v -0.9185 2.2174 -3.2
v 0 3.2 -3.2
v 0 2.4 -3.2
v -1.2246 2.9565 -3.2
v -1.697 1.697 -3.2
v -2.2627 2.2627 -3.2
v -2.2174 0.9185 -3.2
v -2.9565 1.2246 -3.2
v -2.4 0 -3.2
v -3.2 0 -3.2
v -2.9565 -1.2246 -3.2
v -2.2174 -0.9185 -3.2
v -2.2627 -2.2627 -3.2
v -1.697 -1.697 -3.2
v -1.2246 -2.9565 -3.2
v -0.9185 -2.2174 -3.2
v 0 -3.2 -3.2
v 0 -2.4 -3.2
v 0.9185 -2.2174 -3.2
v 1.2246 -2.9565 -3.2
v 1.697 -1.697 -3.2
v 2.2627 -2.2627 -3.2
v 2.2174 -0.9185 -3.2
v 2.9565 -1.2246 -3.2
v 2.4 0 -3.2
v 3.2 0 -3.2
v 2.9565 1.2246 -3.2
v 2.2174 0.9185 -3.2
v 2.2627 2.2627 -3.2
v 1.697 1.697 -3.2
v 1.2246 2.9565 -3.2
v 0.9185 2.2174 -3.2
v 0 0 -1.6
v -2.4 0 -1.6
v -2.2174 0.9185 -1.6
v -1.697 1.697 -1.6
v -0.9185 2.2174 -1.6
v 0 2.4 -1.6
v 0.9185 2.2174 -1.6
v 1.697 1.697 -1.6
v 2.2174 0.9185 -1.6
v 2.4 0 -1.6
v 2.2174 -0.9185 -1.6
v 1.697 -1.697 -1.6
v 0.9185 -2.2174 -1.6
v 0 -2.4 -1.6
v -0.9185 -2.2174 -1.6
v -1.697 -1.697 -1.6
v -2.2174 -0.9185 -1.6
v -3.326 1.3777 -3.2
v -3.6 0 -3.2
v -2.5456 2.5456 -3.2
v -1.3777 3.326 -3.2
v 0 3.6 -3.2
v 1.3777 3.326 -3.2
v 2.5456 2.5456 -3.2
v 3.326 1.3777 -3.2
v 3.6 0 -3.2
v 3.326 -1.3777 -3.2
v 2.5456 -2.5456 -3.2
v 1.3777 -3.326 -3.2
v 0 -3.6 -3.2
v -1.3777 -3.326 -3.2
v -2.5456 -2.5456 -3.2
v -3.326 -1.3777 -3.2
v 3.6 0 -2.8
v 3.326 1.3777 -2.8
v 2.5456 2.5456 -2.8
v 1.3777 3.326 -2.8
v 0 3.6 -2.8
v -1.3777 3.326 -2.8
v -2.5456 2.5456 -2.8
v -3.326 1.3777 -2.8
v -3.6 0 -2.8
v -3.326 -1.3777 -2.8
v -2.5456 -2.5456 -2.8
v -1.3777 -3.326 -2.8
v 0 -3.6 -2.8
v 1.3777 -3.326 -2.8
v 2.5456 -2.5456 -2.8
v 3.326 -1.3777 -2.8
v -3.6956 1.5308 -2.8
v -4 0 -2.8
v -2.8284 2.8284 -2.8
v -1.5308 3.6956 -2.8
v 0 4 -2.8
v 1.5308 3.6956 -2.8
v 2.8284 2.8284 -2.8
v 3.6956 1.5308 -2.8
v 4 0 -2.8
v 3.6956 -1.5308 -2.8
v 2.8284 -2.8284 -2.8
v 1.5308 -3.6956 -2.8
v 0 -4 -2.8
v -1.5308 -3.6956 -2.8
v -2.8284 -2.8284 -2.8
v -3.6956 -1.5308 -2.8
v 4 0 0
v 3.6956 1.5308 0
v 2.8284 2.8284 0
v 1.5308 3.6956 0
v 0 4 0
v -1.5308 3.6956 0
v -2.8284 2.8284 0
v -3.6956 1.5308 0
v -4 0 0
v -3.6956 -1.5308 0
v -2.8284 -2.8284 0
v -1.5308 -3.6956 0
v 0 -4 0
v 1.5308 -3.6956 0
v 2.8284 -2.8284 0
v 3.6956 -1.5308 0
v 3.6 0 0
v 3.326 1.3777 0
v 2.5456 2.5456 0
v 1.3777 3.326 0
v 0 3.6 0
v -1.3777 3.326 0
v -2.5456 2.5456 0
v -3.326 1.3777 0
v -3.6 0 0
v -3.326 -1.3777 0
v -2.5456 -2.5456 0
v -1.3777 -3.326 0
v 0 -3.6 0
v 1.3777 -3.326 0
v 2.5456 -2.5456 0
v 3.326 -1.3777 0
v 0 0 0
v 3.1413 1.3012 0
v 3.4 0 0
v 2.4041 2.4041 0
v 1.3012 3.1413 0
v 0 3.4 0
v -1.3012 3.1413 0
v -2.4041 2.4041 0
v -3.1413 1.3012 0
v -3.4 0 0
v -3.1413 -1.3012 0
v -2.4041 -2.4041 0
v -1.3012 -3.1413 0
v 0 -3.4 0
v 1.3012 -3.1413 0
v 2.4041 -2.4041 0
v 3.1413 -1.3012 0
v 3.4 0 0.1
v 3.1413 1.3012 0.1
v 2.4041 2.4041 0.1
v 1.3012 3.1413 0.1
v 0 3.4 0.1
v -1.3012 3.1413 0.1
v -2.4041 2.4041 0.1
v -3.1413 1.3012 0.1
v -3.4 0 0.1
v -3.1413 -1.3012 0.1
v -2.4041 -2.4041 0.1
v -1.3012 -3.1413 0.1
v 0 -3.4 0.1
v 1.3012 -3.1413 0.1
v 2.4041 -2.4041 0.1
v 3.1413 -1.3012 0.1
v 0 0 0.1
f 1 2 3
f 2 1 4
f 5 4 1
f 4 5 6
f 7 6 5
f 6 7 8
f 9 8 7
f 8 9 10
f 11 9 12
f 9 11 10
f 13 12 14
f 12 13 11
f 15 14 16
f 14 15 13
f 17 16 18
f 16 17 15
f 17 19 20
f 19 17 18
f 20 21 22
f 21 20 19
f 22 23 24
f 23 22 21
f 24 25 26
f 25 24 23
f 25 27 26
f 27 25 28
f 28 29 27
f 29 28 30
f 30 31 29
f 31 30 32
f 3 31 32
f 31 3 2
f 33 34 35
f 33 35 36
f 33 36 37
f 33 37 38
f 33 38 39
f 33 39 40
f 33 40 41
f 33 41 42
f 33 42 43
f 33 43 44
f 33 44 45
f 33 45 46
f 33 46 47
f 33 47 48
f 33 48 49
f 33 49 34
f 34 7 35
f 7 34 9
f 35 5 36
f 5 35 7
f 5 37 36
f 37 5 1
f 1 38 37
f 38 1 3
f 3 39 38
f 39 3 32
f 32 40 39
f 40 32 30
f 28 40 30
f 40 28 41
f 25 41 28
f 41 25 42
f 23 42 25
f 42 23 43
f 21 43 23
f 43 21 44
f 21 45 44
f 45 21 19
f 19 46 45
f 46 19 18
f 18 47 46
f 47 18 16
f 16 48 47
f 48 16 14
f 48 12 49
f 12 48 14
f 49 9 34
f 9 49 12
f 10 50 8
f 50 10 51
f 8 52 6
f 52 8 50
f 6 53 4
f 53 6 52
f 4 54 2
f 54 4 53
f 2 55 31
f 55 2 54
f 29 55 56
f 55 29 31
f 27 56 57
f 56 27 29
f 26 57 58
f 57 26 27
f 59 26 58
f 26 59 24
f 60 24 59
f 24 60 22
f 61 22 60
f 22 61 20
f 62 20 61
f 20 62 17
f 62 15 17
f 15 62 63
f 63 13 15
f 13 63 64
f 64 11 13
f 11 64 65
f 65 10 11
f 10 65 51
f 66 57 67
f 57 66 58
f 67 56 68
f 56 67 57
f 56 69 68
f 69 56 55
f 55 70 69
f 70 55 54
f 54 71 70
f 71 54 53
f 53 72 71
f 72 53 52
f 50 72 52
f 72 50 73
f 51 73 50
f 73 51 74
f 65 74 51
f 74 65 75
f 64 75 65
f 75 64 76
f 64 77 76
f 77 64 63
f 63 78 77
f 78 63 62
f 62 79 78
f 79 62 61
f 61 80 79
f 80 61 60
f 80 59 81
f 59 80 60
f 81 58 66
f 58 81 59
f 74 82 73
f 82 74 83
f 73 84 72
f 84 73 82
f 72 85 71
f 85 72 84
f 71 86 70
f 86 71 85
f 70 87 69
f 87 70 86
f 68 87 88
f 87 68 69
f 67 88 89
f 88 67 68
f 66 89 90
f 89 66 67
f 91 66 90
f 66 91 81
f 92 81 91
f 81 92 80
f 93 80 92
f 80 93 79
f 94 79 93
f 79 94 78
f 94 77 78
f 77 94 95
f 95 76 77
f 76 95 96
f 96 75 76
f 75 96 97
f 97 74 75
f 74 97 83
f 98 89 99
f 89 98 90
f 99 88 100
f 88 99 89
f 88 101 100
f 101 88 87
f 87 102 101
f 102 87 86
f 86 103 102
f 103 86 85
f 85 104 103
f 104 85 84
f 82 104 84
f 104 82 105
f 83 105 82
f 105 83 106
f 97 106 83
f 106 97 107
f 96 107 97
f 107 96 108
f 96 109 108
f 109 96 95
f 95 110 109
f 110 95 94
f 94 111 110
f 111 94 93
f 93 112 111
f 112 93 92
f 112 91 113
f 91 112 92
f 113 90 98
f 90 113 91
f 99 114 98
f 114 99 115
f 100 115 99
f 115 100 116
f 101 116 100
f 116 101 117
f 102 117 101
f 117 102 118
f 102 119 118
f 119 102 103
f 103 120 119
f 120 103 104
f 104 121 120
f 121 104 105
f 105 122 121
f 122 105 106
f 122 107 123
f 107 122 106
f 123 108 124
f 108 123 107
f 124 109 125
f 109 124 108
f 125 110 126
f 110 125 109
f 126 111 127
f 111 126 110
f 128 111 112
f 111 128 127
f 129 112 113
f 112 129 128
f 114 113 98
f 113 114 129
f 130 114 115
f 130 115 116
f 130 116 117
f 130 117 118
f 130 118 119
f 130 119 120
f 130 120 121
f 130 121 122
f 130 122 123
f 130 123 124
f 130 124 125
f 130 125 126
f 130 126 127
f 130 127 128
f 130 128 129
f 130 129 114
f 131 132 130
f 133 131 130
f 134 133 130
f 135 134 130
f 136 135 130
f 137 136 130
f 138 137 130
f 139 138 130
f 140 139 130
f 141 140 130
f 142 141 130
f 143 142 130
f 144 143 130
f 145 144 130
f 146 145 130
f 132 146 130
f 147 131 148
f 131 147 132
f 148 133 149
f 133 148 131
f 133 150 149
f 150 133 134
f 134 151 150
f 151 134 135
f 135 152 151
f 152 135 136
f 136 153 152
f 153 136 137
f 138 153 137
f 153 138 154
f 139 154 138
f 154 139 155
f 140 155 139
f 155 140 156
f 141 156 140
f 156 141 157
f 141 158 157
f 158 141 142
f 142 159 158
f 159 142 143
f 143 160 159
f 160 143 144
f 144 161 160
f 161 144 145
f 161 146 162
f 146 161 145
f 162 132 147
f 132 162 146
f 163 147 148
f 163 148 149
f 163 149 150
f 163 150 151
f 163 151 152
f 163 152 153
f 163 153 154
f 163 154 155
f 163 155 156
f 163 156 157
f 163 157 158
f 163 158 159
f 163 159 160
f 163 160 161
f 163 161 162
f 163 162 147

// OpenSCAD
// file: ../p/4-4ring3.scad
use <../lib.scad>
function ldraw_lib__4_4ring3() = [
// 0 Ring  3 x 1.0
// 0 Name: 4-4ring3.dat
// 0 Author: James Jessiman
// 0 !LDRAW_ORG Primitive UPDATE 2009-01
// 0 !LICENSE Licensed under CC BY 4.0 : see CAreadme.txt
// 
// 0 BFC CERTIFY CCW
  [0,"BFC","CERTIFY"],
  [0,"BFC","CCW"],
// 
// 0 !HISTORY 1998-12-15 [PTadmin] Official Update 1998-10
// 0 !HISTORY 2002-04-05 [hafhead] Added BFC statement
// 0 !HISTORY 2002-04-25 [PTadmin] Official Update 2002-02
// 0 !HISTORY 2007-06-24 [PTadmin] Header formatted for Contributor Agreement
// 0 !HISTORY 2008-07-01 [PTadmin] Official Update 2008-01
// 0 !HISTORY 2008-08-26 [cwdee] Switch polygon winding and rename
// 0 !HISTORY 2009-05-02 [PTadmin] Official Update 2009-01
// 
// 
// 4 16 -1.5308 0 3.6956 -1.1481 0 2.7717 0 0 3 0 0 4
  [4,16,-1.5308,0,3.6956,-1.1481,0,2.7717,0,0,3,0,0,4],
// 4 16 -2.8284 0 2.8284 -2.1213 0 2.1213 -1.1481 0 2.7717 -1.5308 0 3.6956
  [4,16,-2.8284,0,2.8284,-2.1213,0,2.1213,-1.1481,0,2.7717,-1.5308,0,3.6956],
// 4 16 -3.6956 0 1.5308 -2.7717 0 1.1481 -2.1213 0 2.1213 -2.8284 0 2.8284
  [4,16,-3.6956,0,1.5308,-2.7717,0,1.1481,-2.1213,0,2.1213,-2.8284,0,2.8284],
// 4 16 -4 0 0 -3 0 0 -2.7717 0 1.1481 -3.6956 0 1.5308
  [4,16,-4,0,0,-3,0,0,-2.7717,0,1.1481,-3.6956,0,1.5308],
// 4 16 -3.6956 0 -1.5308 -2.7717 0 -1.1481 -3 0 0 -4 0 0
  [4,16,-3.6956,0,-1.5308,-2.7717,0,-1.1481,-3,0,0,-4,0,0],
// 4 16 -2.8284 0 -2.8284 -2.1213 0 -2.1213 -2.7717 0 -1.1481 -3.6956 0 -1.5308
  [4,16,-2.8284,0,-2.8284,-2.1213,0,-2.1213,-2.7717,0,-1.1481,-3.6956,0,-1.5308],
// 4 16 -1.5308 0 -3.6956 -1.1481 0 -2.7717 -2.1213 0 -2.1213 -2.8284 0 -2.8284
  [4,16,-1.5308,0,-3.6956,-1.1481,0,-2.7717,-2.1213,0,-2.1213,-2.8284,0,-2.8284],
// 4 16 0 0 -4 0 0 -3 -1.1481 0 -2.7717 -1.5308 0 -3.6956
  [4,16,0,0,-4,0,0,-3,-1.1481,0,-2.7717,-1.5308,0,-3.6956],
// 4 16 1.5308 0 -3.6956 1.1481 0 -2.7717 0 0 -3 0 0 -4
  [4,16,1.5308,0,-3.6956,1.1481,0,-2.7717,0,0,-3,0,0,-4],
// 4 16 2.8284 0 -2.8284 2.1213 0 -2.1213 1.1481 0 -2.7717 1.5308 0 -3.6956
  [4,16,2.8284,0,-2.8284,2.1213,0,-2.1213,1.1481,0,-2.7717,1.5308,0,-3.6956],
// 4 16 3.6956 0 -1.5308 2.7717 0 -1.1481 2.1213 0 -2.1213 2.8284 0 -2.8284
  [4,16,3.6956,0,-1.5308,2.7717,0,-1.1481,2.1213,0,-2.1213,2.8284,0,-2.8284],
// 4 16 4 0 0 3 0 0 2.7717 0 -1.1481 3.6956 0 -1.5308
  [4,16,4,0,0,3,0,0,2.7717,0,-1.1481,3.6956,0,-1.5308],
// 4 16 3.6956 0 1.5308 2.7717 0 1.1481 3 0 0 4 0 0
  [4,16,3.6956,0,1.5308,2.7717,0,1.1481,3,0,0,4,0,0],
// 4 16 2.8284 0 2.8284 2.1213 0 2.1213 2.7717 0 1.1481 3.6956 0 1.5308
  [4,16,2.8284,0,2.8284,2.1213,0,2.1213,2.7717,0,1.1481,3.6956,0,1.5308],
// 4 16 1.5308 0 3.6956 1.1481 0 2.7717 2.1213 0 2.1213 2.8284 0 2.8284
  [4,16,1.5308,0,3.6956,1.1481,0,2.7717,2.1213,0,2.1213,2.8284,0,2.8284],
// 4 16 0 0 4 0 0 3 1.1481 0 2.7717 1.5308 0 3.6956
  [4,16,0,0,4,0,0,3,1.1481,0,2.7717,1.5308,0,3.6956],
// 0
];
module ldraw_lib__4_4ring3(step=0, col=false, unit=2/5, alt=false, line=0.2, solid=!$preview)
    makepoly(ldraw_lib__4_4ring3(), step=step, col=col, unit=unit, alt=alt, line=line, solid=solid);
ldraw_lib__4_4ring3(line=0.2);
// file: ../p/4-4cylc.scad
use <../lib.scad>
use <4-4cyli.scad>
use <4-4disc.scad>
use <4-4edge.scad>
function ldraw_lib__4_4cylc() = [
// 0 Cylinder Closed 1.0
// 0 Name: 4-4cylc.dat
// 0 Author: Alex Taylor [anathema]
// 0 !LDRAW_ORG Primitive UPDATE 2009-02
// 0 !LICENSE Licensed under CC BY 4.0 : see CAreadme.txt
// 
// 0 BFC CERTIFY CCW
  [0,"BFC","CERTIFY"],
  [0,"BFC","CCW"],
// 
// 0 !HISTORY 2008-12-29 [cwdee] Removed one disc
// 0 !HISTORY 2009-09-03 [PTadmin] Official Update 2009-02
// 
// 
// 1 16 0 0 0 1 0 0 0 1 0 0 0 1 4-4edge.dat
  [1,16,0,0,0,1,0,0,0,1,0,0,0,1, ldraw_lib__4_4edge()],
// 1 16 0 1 0 1 0 0 0 1 0 0 0 1 4-4edge.dat
  [1,16,0,1,0,1,0,0,0,1,0,0,0,1, ldraw_lib__4_4edge()],
// 1 16 0 0 0 1 0 0 0 1 0 0 0 1 4-4disc.dat
  [1,16,0,0,0,1,0,0,0,1,0,0,0,1, ldraw_lib__4_4disc()],
// 1 16 0 0 0 1 0 0 0 1 0 0 0 1 4-4cyli.dat
  [1,16,0,0,0,1,0,0,0,1,0,0,0,1, ldraw_lib__4_4cyli()],
// 0
];
module ldraw_lib__4_4cylc(step=0, col=false, unit=2/5, alt=false, line=0.2, solid=!$preview)
    makepoly(ldraw_lib__4_4cylc(), step=step, col=col, unit=unit, alt=alt, line=line, solid=solid);
ldraw_lib__4_4cylc(line=0.2);
// file: ../p/4-4edge.scad
use <../lib.scad>
function ldraw_lib__4_4edge() = [
// 0 Circle 1.0
// 0 Name: 4-4edge.dat
// 0 Author: James Jessiman
// 0 !LDRAW_ORG Primitive UPDATE 2017-01
// 0 !LICENSE Licensed under CC BY 4.0 : see CAreadme.txt
// 
// 0 BFC CERTIFY CCW
  [0,"BFC","CERTIFY"],
  [0,"BFC","CCW"],
// 
// 0 !HISTORY 1998-12-15 [PTadmin] Official Update 1998-10
// 0 !HISTORY 2005-12-28 [PTadmin] Official Update 2005-01
// 0 !HISTORY 2007-06-24 [PTadmin] Header formatted for Contributor Agreement
// 0 !HISTORY 2008-07-01 [PTadmin] Official Update 2008-01
// 0 !HISTORY 2017-01-15 [Steffen] BFCed
// 0 !HISTORY 2017-12-30 [PTadmin] Official Update 2017-01
// 
// 
// 2 24 1 0 0 0.9239 0 0.3827
  [2,24,1,0,0,0.9239,0,0.3827],
// 2 24 0.9239 0 0.3827 0.7071 0 0.7071
  [2,24,0.9239,0,0.3827,0.7071,0,0.7071],
// 2 24 0.7071 0 0.7071 0.3827 0 0.9239
  [2,24,0.7071,0,0.7071,0.3827,0,0.9239],
// 2 24 0.3827 0 0.9239 0 0 1
  [2,24,0.3827,0,0.9239,0,0,1],
// 2 24 0 0 1 -0.3827 0 0.9239
  [2,24,0,0,1,-0.3827,0,0.9239],
// 2 24 -0.3827 0 0.9239 -0.7071 0 0.7071
  [2,24,-0.3827,0,0.9239,-0.7071,0,0.7071],
// 2 24 -0.7071 0 0.7071 -0.9239 0 0.3827
  [2,24,-0.7071,0,0.7071,-0.9239,0,0.3827],
// 2 24 -0.9239 0 0.3827 -1 0 -0
  [2,24,-0.9239,0,0.3827,-1,0,-0],
// 2 24 -1 0 -0 -0.9239 0 -0.3827
  [2,24,-1,0,-0,-0.9239,0,-0.3827],
// 2 24 -0.9239 0 -0.3827 -0.7071 0 -0.7071
  [2,24,-0.9239,0,-0.3827,-0.7071,0,-0.7071],
// 2 24 -0.7071 0 -0.7071 -0.3827 0 -0.9239
  [2,24,-0.7071,0,-0.7071,-0.3827,0,-0.9239],
// 2 24 -0.3827 0 -0.9239 0 0 -1
  [2,24,-0.3827,0,-0.9239,0,0,-1],
// 2 24 0 0 -1 0.3827 0 -0.9239
  [2,24,0,0,-1,0.3827,0,-0.9239],
// 2 24 0.3827 0 -0.9239 0.7071 0 -0.7071
  [2,24,0.3827,0,-0.9239,0.7071,0,-0.7071],
// 2 24 0.7071 0 -0.7071 0.9239 0 -0.3827
  [2,24,0.7071,0,-0.7071,0.9239,0,-0.3827],
// 2 24 0.9239 0 -0.3827 1 0 0
  [2,24,0.9239,0,-0.3827,1,0,0],
];
module ldraw_lib__4_4edge(step=0, col=false, unit=2/5, alt=false, line=0.2, solid=!$preview)
    makepoly(ldraw_lib__4_4edge(), step=step, col=col, unit=unit, alt=alt, line=line, solid=solid);
ldraw_lib__4_4edge(line=0.2);
// file: ../p/stud4o.scad
use <../lib.scad>
use <4-4cylc.scad>
use <4-4ring3.scad>
function ldraw_lib__stud4o() = [
// 0 Stud Tube Open without Outer Cylinder
// 0 Name: stud4o.dat
// 0 Author: Magnus Forsberg [MagFors]
// 0 !LDRAW_ORG Primitive UPDATE 2011-02
// 0 !LICENSE Licensed under CC BY 4.0 : see CAreadme.txt
// 
// 0 !HELP This stud is a "antistud" to be used like a underside stud,
// 0 !HELP but without the outer cylinder.
// 0 !HELP 1 47 0 0 0 1 0 0 0 1 0 0 0 1 stud4.dat
// 
// 0 BFC CERTIFY CCW
  [0,"BFC","CERTIFY"],
  [0,"BFC","CCW"],
// 
// 0 !HISTORY 2011-12-29 [PTadmin] Official Update 2011-02
// 
// 
// 1 16 0 -4 0 2 0 0 0 1 0 0 0 2 4-4ring3.dat
  [1,16,0,-4,0,2,0,0,0,1,0,0,0,2, ldraw_lib__4_4ring3()],
// 0 BFC INVERTNEXT
  [0,"BFC","INVERTNEXT"],
// 1 16 0 0 0 -6 0 0 0 -4 0 0 0 6 4-4cylc.dat
  [1,16,0,0,0,-6,0,0,0,-4,0,0,0,6, ldraw_lib__4_4cylc()],
];
module ldraw_lib__stud4o(step=0, col=false, unit=2/5, alt=false, line=0.2, solid=!$preview)
    makepoly(ldraw_lib__stud4o(), step=step, col=col, unit=unit, alt=alt, line=line, solid=solid);
ldraw_lib__stud4o(line=0.2);
// file: ../p/4-4ring8.scad
use <../lib.scad>
function ldraw_lib__4_4ring8() = [
// 0 Ring  8 x 1.0
// 0 Name: 4-4ring8.dat
// 0 Author: Steffen [Steffen]
// 0 !LDRAW_ORG Primitive UPDATE 2012-01
// 0 !LICENSE Licensed under CC BY 4.0 : see CAreadme.txt
// 
// 0 BFC CERTIFY CCW
  [0,"BFC","CERTIFY"],
  [0,"BFC","CCW"],
// 
// 0 !HISTORY 2003-12-19 [PTadmin] Official Update 2003-03
// 0 !HISTORY 2007-06-24 [PTadmin] Header formatted for Contributor Agreement
// 0 !HISTORY 2008-07-01 [PTadmin] Official Update 2008-01
// 0 !HISTORY 2012-02-16 [Philo] Changed to CCW
// 0 !HISTORY 2012-03-30 [PTadmin] Official Update 2012-01
// 
// 
// 4 16 9 0 0 8.3151 0 3.4443 7.3912 0 3.0616 8 0 0
  [4,16,9,0,0,8.3151,0,3.4443,7.3912,0,3.0616,8,0,0],
// 4 16 8.3151 0 3.4443 6.3639 0 6.3639 5.6568 0 5.6568 7.3912 0 3.0616
  [4,16,8.3151,0,3.4443,6.3639,0,6.3639,5.6568,0,5.6568,7.3912,0,3.0616],
// 4 16 6.3639 0 6.3639 3.4443 0 8.3151 3.0616 0 7.3912 5.6568 0 5.6568
  [4,16,6.3639,0,6.3639,3.4443,0,8.3151,3.0616,0,7.3912,5.6568,0,5.6568],
// 4 16 3.4443 0 8.3151 0 0 9 0 0 8 3.0616 0 7.3912
  [4,16,3.4443,0,8.3151,0,0,9,0,0,8,3.0616,0,7.3912],
// 4 16 0 0 9 -3.4443 0 8.3151 -3.0616 0 7.3912 0 0 8
  [4,16,0,0,9,-3.4443,0,8.3151,-3.0616,0,7.3912,0,0,8],
// 4 16 -3.4443 0 8.3151 -6.3639 0 6.3639 -5.6568 0 5.6568 -3.0616 0 7.3912
  [4,16,-3.4443,0,8.3151,-6.3639,0,6.3639,-5.6568,0,5.6568,-3.0616,0,7.3912],
// 4 16 -6.3639 0 6.3639 -8.3151 0 3.4443 -7.3912 0 3.0616 -5.6568 0 5.6568
  [4,16,-6.3639,0,6.3639,-8.3151,0,3.4443,-7.3912,0,3.0616,-5.6568,0,5.6568],
// 4 16 -8.3151 0 3.4443 -9 0 0 -8 0 0 -7.3912 0 3.0616
  [4,16,-8.3151,0,3.4443,-9,0,0,-8,0,0,-7.3912,0,3.0616],
// 4 16 -9 0 0 -8.3151 0 -3.4443 -7.3912 0 -3.0616 -8 0 0
  [4,16,-9,0,0,-8.3151,0,-3.4443,-7.3912,0,-3.0616,-8,0,0],
// 4 16 -8.3151 0 -3.4443 -6.3639 0 -6.3639 -5.6568 0 -5.6568 -7.3912 0 -3.0616
  [4,16,-8.3151,0,-3.4443,-6.3639,0,-6.3639,-5.6568,0,-5.6568,-7.3912,0,-3.0616],
// 4 16 -6.3639 0 -6.3639 -3.4443 0 -8.3151 -3.0616 0 -7.3912 -5.6568 0 -5.6568
  [4,16,-6.3639,0,-6.3639,-3.4443,0,-8.3151,-3.0616,0,-7.3912,-5.6568,0,-5.6568],
// 4 16 -3.4443 0 -8.3151 0 0 -9 0 0 -8 -3.0616 0 -7.3912
  [4,16,-3.4443,0,-8.3151,0,0,-9,0,0,-8,-3.0616,0,-7.3912],
// 4 16 0 0 -9 3.4443 0 -8.3151 3.0616 0 -7.3912 0 0 -8
  [4,16,0,0,-9,3.4443,0,-8.3151,3.0616,0,-7.3912,0,0,-8],
// 4 16 3.4443 0 -8.3151 6.3639 0 -6.3639 5.6568 0 -5.6568 3.0616 0 -7.3912
  [4,16,3.4443,0,-8.3151,6.3639,0,-6.3639,5.6568,0,-5.6568,3.0616,0,-7.3912],
// 4 16 6.3639 0 -6.3639 8.3151 0 -3.4443 7.3912 0 -3.0616 5.6568 0 -5.6568
  [4,16,6.3639,0,-6.3639,8.3151,0,-3.4443,7.3912,0,-3.0616,5.6568,0,-5.6568],
// 4 16 8.3151 0 -3.4443 9 0 0 8 0 0 7.3912 0 -3.0616
  [4,16,8.3151,0,-3.4443,9,0,0,8,0,0,7.3912,0,-3.0616],
];
module ldraw_lib__4_4ring8(step=0, col=false, unit=2/5, alt=false, line=0.2, solid=!$preview)
    makepoly(ldraw_lib__4_4ring8(), step=step, col=col, unit=unit, alt=alt, line=line, solid=solid);
ldraw_lib__4_4ring8(line=0.2);
// file: ../p/4-4cylo.scad
use <../lib.scad>
use <4-4cyli.scad>
use <4-4edge.scad>
function ldraw_lib__4_4cylo() = [
// 0 Cylinder Open 1.0
// 0 Name: 4-4cylo.dat
// 0 Author: Mark Kennedy [mkennedy]
// 0 !LDRAW_ORG Primitive UPDATE 2010-01
// 0 !LICENSE Licensed under CC BY 4.0 : see CAreadme.txt
// 
// 0 BFC CERTIFY CCW
  [0,"BFC","CERTIFY"],
  [0,"BFC","CCW"],
// 
// 0 !HISTORY 2010-04-05 [PTadmin] Official Update 2010-01
// 
// 
// 1 16 0 0 0 1 0 0 0 1 0 0 0 1 4-4edge.dat
  [1,16,0,0,0,1,0,0,0,1,0,0,0,1, ldraw_lib__4_4edge()],
// 1 16 0 1 0 1 0 0 0 1 0 0 0 1 4-4edge.dat
  [1,16,0,1,0,1,0,0,0,1,0,0,0,1, ldraw_lib__4_4edge()],
// 1 16 0 0 0 1 0 0 0 1 0 0 0 1 4-4cyli.dat
  [1,16,0,0,0,1,0,0,0,1,0,0,0,1, ldraw_lib__4_4cyli()],
// 0
];
module ldraw_lib__4_4cylo(step=0, col=false, unit=2/5, alt=false, line=0.2, solid=!$preview)
    makepoly(ldraw_lib__4_4cylo(), step=step, col=col, unit=unit, alt=alt, line=line, solid=solid);
ldraw_lib__4_4cylo(line=0.2);
// file: s/98138s02.scad
use <../../lib.scad>
use <../../p/4-4cylo.scad>
use <../../p/4-4ring8.scad>
use <../../p/4-4ring9.scad>
use <../../p/stud4o.scad>
function ldraw_lib__s__98138s02() = [
// 0 ~Tile  1 x  1 Round with Groove without Complete Top Face
// 0 Name: s\98138s02.dat
// 0 Author: Magnus Forsberg [MagFors]
// 0 !LDRAW_ORG Subpart UPDATE 2020-01
// 0 !LICENSE Licensed under CC BY 4.0 : see CAreadme.txt
// 
// 0 BFC CERTIFY CCW
  [0,"BFC","CERTIFY"],
  [0,"BFC","CCW"],
// 
// 0 !HISTORY 2020-06-28 [PTadmin] Official Update 2020-01
// 
// 
// 1 16 0 4 0 1 0 0 0 -1 0 0 0 1 stud4o.dat
  [1,16,0,4,0,1,0,0,0,-1,0,0,0,1, ldraw_lib__stud4o()],
// 1 16 0 8 0 -1 0 0 0 -1 0 0 0 1 4-4ring8.dat
  [1,16,0,8,0,-1,0,0,0,-1,0,0,0,1, ldraw_lib__4_4ring8()],
// 1 16 0 7 0 9 0 0 0 1 0 0 0 9 4-4cylo.dat
  [1,16,0,7,0,9,0,0,0,1,0,0,0,9, ldraw_lib__4_4cylo()],
// 1 16 0 7 0 -1 0 0 0 -1 0 0 0 1 4-4ring9.dat
  [1,16,0,7,0,-1,0,0,0,-1,0,0,0,1, ldraw_lib__4_4ring9()],
// 1 16 0 0 0 10 0 0 0 7 0 0 0 10 4-4cylo.dat
  [1,16,0,0,0,10,0,0,0,7,0,0,0,10, ldraw_lib__4_4cylo()],
];
module ldraw_lib__s__98138s02(step=0, col=false, unit=2/5, alt=false, line=0.2, solid=!$preview)
    makepoly(ldraw_lib__s__98138s02(), step=step, col=col, unit=unit, alt=alt, line=line, solid=solid);
ldraw_lib__s__98138s02(line=0.2);
// file: ../p/4-4ring9.scad
use <../lib.scad>
function ldraw_lib__4_4ring9() = [
// 0 Ring  9 x 1.0
// 0 Name: 4-4ring9.dat
// 0 Author: Magnus Forsberg [MagFors]
// 0 !LDRAW_ORG Primitive UPDATE 2024-01
// 0 !LICENSE Licensed under CC BY 4.0 : see CAreadme.txt
// 
// 0 BFC CERTIFY CCW
  [0,"BFC","CERTIFY"],
  [0,"BFC","CCW"],
// 
// 0 !HISTORY 2004-04-22 [PTadmin] Official Update 2004-02
// 0 !HISTORY 2007-06-24 [PTadmin] Header formatted for Contributor Agreement
// 0 !HISTORY 2008-07-01 [PTadmin] Official Update 2008-01
// 0 !HISTORY 2024-01-04 [MagFors] Complete regeneration, original by jriley
// 0 !HISTORY 2024-01-29 [OrionP] Official Update 2024-01
// 
// 4 16 10 0 0 9.239 0 3.827 8.3151 0 3.4443 9 0 0
  [4,16,10,0,0,9.239,0,3.827,8.3151,0,3.4443,9,0,0],
// 4 16 9.239 0 3.827 7.071 0 7.071 6.3639 0 6.3639 8.3151 0 3.4443
  [4,16,9.239,0,3.827,7.071,0,7.071,6.3639,0,6.3639,8.3151,0,3.4443],
// 4 16 7.071 0 7.071 3.827 0 9.239 3.4443 0 8.3151 6.3639 0 6.3639
  [4,16,7.071,0,7.071,3.827,0,9.239,3.4443,0,8.3151,6.3639,0,6.3639],
// 4 16 3.827 0 9.239 0 0 10 0 0 9 3.4443 0 8.3151
  [4,16,3.827,0,9.239,0,0,10,0,0,9,3.4443,0,8.3151],
// 4 16 0 0 10 -3.827 0 9.239 -3.4443 0 8.3151 0 0 9
  [4,16,0,0,10,-3.827,0,9.239,-3.4443,0,8.3151,0,0,9],
// 4 16 -3.827 0 9.239 -7.071 0 7.071 -6.3639 0 6.3639 -3.4443 0 8.3151
  [4,16,-3.827,0,9.239,-7.071,0,7.071,-6.3639,0,6.3639,-3.4443,0,8.3151],
// 4 16 -7.071 0 7.071 -9.239 0 3.827 -8.3151 0 3.4443 -6.3639 0 6.3639
  [4,16,-7.071,0,7.071,-9.239,0,3.827,-8.3151,0,3.4443,-6.3639,0,6.3639],
// 4 16 -9.239 0 3.827 -10 0 0 -9 0 0 -8.3151 0 3.4443
  [4,16,-9.239,0,3.827,-10,0,0,-9,0,0,-8.3151,0,3.4443],
// 4 16 -10 0 0 -9.239 0 -3.827 -8.3151 0 -3.4443 -9 0 0
  [4,16,-10,0,0,-9.239,0,-3.827,-8.3151,0,-3.4443,-9,0,0],
// 4 16 -9.239 0 -3.827 -7.071 0 -7.071 -6.3639 0 -6.3639 -8.3151 0 -3.4443
  [4,16,-9.239,0,-3.827,-7.071,0,-7.071,-6.3639,0,-6.3639,-8.3151,0,-3.4443],
// 4 16 -7.071 0 -7.071 -3.827 0 -9.239 -3.4443 0 -8.3151 -6.3639 0 -6.3639
  [4,16,-7.071,0,-7.071,-3.827,0,-9.239,-3.4443,0,-8.3151,-6.3639,0,-6.3639],
// 4 16 -3.827 0 -9.239 0 0 -10 0 0 -9 -3.4443 0 -8.3151
  [4,16,-3.827,0,-9.239,0,0,-10,0,0,-9,-3.4443,0,-8.3151],
// 4 16 0 0 -10 3.827 0 -9.239 3.4443 0 -8.3151 0 0 -9
  [4,16,0,0,-10,3.827,0,-9.239,3.4443,0,-8.3151,0,0,-9],
// 4 16 3.827 0 -9.239 7.071 0 -7.071 6.3639 0 -6.3639 3.4443 0 -8.3151
  [4,16,3.827,0,-9.239,7.071,0,-7.071,6.3639,0,-6.3639,3.4443,0,-8.3151],
// 4 16 7.071 0 -7.071 9.239 0 -3.827 8.3151 0 -3.4443 6.3639 0 -6.3639
  [4,16,7.071,0,-7.071,9.239,0,-3.827,8.3151,0,-3.4443,6.3639,0,-6.3639],
// 4 16 9.239 0 -3.827 10 0 0 9 0 0 8.3151 0 -3.4443
  [4,16,9.239,0,-3.827,10,0,0,9,0,0,8.3151,0,-3.4443],
// 0 // Build by LDPartEditor (PrimGen 2.X)
];
module ldraw_lib__4_4ring9(step=0, col=false, unit=2/5, alt=false, line=0.2, solid=!$preview)
    makepoly(ldraw_lib__4_4ring9(), step=step, col=col, unit=unit, alt=alt, line=line, solid=solid);
ldraw_lib__4_4ring9(line=0.2);
// file: ../p/4-4cyli.scad
use <../lib.scad>
function ldraw_lib__4_4cyli() = [
// 0 Cylinder 1.0
// 0 Name: 4-4cyli.dat
// 0 Author: James Jessiman
// 0 !LDRAW_ORG Primitive UPDATE 2005-01
// 0 !LICENSE Licensed under CC BY 4.0 : see CAreadme.txt
// 
// 0 BFC CERTIFY CCW
  [0,"BFC","CERTIFY"],
  [0,"BFC","CCW"],
// 
// 0 !HISTORY 1998-12-15 [PTadmin] Official Update 1998-10
// 0 !HISTORY 2002-03-23 [sbliss] Added BFC statement; merged headers from files in distributions LDraw 0.27 and Complete.
// 0 !HISTORY 2002-04-25 [PTadmin] Official Update 2002-02
// 0 !HISTORY 2004-12-14 [guyvivan] BFC CCW
// 0 !HISTORY 2005-12-28 [PTadmin] Official Update 2005-01
// 0 !HISTORY 2007-06-24 [PTadmin] Header formatted for Contributor Agreement
// 0 !HISTORY 2008-07-01 [PTadmin] Official Update 2008-01
// 
// 
// 4 16 1 1 0 0.9239 1 0.3827 0.9239 0 0.3827 1 0 0
  [4,16,1,1,0,0.9239,1,0.3827,0.9239,0,0.3827,1,0,0],
// 5 24 1 0 0 1 1 0 0.9239 0 0.3827 0.9239 0 -0.3827
  [5,24,1,0,0,1,1,0,0.9239,0,0.3827,0.9239,0,-0.3827],
// 4 16 0.9239 1 0.3827 0.7071 1 0.7071 0.7071 0 0.7071 0.9239 0 0.3827
  [4,16,0.9239,1,0.3827,0.7071,1,0.7071,0.7071,0,0.7071,0.9239,0,0.3827],
// 5 24 0.9239 0 0.3827 0.9239 1 0.3827 0.7071 0 0.7071 1 0 0
  [5,24,0.9239,0,0.3827,0.9239,1,0.3827,0.7071,0,0.7071,1,0,0],
// 4 16 0.7071 1 0.7071 0.3827 1 0.9239 0.3827 0 0.9239 0.7071 0 0.7071
  [4,16,0.7071,1,0.7071,0.3827,1,0.9239,0.3827,0,0.9239,0.7071,0,0.7071],
// 5 24 0.7071 0 0.7071 0.7071 1 0.7071 0.3827 0 0.9239 0.9239 0 0.3827
  [5,24,0.7071,0,0.7071,0.7071,1,0.7071,0.3827,0,0.9239,0.9239,0,0.3827],
// 4 16 0.3827 1 0.9239 0 1 1 0 0 1 0.3827 0 0.9239
  [4,16,0.3827,1,0.9239,0,1,1,0,0,1,0.3827,0,0.9239],
// 5 24 0.3827 0 0.9239 0.3827 1 0.9239 0 0 1 0.7071 0 0.7071
  [5,24,0.3827,0,0.9239,0.3827,1,0.9239,0,0,1,0.7071,0,0.7071],
// 4 16 0 1 1 -0.3827 1 0.9239 -0.3827 0 0.9239 0 0 1
  [4,16,0,1,1,-0.3827,1,0.9239,-0.3827,0,0.9239,0,0,1],
// 5 24 0 0 1 0 1 1 -0.3827 0 0.9239 0.3827 0 0.9239
  [5,24,0,0,1,0,1,1,-0.3827,0,0.9239,0.3827,0,0.9239],
// 4 16 -0.3827 1 0.9239 -0.7071 1 0.7071 -0.7071 0 0.7071 -0.3827 0 0.9239
  [4,16,-0.3827,1,0.9239,-0.7071,1,0.7071,-0.7071,0,0.7071,-0.3827,0,0.9239],
// 5 24 -0.3827 0 0.9239 -0.3827 1 0.9239 -0.7071 0 0.7071 0 0 1
  [5,24,-0.3827,0,0.9239,-0.3827,1,0.9239,-0.7071,0,0.7071,0,0,1],
// 4 16 -0.7071 1 0.7071 -0.9239 1 0.3827 -0.9239 0 0.3827 -0.7071 0 0.7071
  [4,16,-0.7071,1,0.7071,-0.9239,1,0.3827,-0.9239,0,0.3827,-0.7071,0,0.7071],
// 5 24 -0.7071 0 0.7071 -0.7071 1 0.7071 -0.9239 0 0.3827 -0.3827 0 0.9239
  [5,24,-0.7071,0,0.7071,-0.7071,1,0.7071,-0.9239,0,0.3827,-0.3827,0,0.9239],
// 4 16 -0.9239 1 0.3827 -1 1 0 -1 0 0 -0.9239 0 0.3827
  [4,16,-0.9239,1,0.3827,-1,1,0,-1,0,0,-0.9239,0,0.3827],
// 5 24 -0.9239 0 0.3827 -0.9239 1 0.3827 -1 0 0 -0.7071 0 0.7071
  [5,24,-0.9239,0,0.3827,-0.9239,1,0.3827,-1,0,0,-0.7071,0,0.7071],
// 4 16 -1 1 0 -0.9239 1 -0.3827 -0.9239 0 -0.3827 -1 0 0
  [4,16,-1,1,0,-0.9239,1,-0.3827,-0.9239,0,-0.3827,-1,0,0],
// 5 24 -1 0 0 -1 1 0 -0.9239 0 -0.3827 -0.9239 0 0.3827
  [5,24,-1,0,0,-1,1,0,-0.9239,0,-0.3827,-0.9239,0,0.3827],
// 4 16 -0.9239 1 -0.3827 -0.7071 1 -0.7071 -0.7071 0 -0.7071 -0.9239 0 -0.3827
  [4,16,-0.9239,1,-0.3827,-0.7071,1,-0.7071,-0.7071,0,-0.7071,-0.9239,0,-0.3827],
// 5 24 -0.9239 0 -0.3827 -0.9239 1 -0.3827 -0.7071 0 -0.7071 -1 0 0
  [5,24,-0.9239,0,-0.3827,-0.9239,1,-0.3827,-0.7071,0,-0.7071,-1,0,0],
// 4 16 -0.7071 1 -0.7071 -0.3827 1 -0.9239 -0.3827 0 -0.9239 -0.7071 0 -0.7071
  [4,16,-0.7071,1,-0.7071,-0.3827,1,-0.9239,-0.3827,0,-0.9239,-0.7071,0,-0.7071],
// 5 24 -0.7071 0 -0.7071 -0.7071 1 -0.7071 -0.3827 0 -0.9239 -0.9239 0 -0.3827
  [5,24,-0.7071,0,-0.7071,-0.7071,1,-0.7071,-0.3827,0,-0.9239,-0.9239,0,-0.3827],
// 4 16 -0.3827 1 -0.9239 0 1 -1 0 0 -1 -0.3827 0 -0.9239
  [4,16,-0.3827,1,-0.9239,0,1,-1,0,0,-1,-0.3827,0,-0.9239],
// 5 24 -0.3827 0 -0.9239 -0.3827 1 -0.9239 0 0 -1 -0.7071 0 -0.7071
  [5,24,-0.3827,0,-0.9239,-0.3827,1,-0.9239,0,0,-1,-0.7071,0,-0.7071],
// 4 16 0 1 -1 0.3827 1 -0.9239 0.3827 0 -0.9239 0 0 -1
  [4,16,0,1,-1,0.3827,1,-0.9239,0.3827,0,-0.9239,0,0,-1],
// 5 24 0 0 -1 0 1 -1 0.3827 0 -0.9239 -0.3827 0 -0.9239
  [5,24,0,0,-1,0,1,-1,0.3827,0,-0.9239,-0.3827,0,-0.9239],
// 4 16 0.3827 1 -0.9239 0.7071 1 -0.7071 0.7071 0 -0.7071 0.3827 0 -0.9239
  [4,16,0.3827,1,-0.9239,0.7071,1,-0.7071,0.7071,0,-0.7071,0.3827,0,-0.9239],
// 5 24 0.3827 0 -0.9239 0.3827 1 -0.9239 0.7071 0 -0.7071 0 0 -1
  [5,24,0.3827,0,-0.9239,0.3827,1,-0.9239,0.7071,0,-0.7071,0,0,-1],
// 4 16 0.7071 1 -0.7071 0.9239 1 -0.3827 0.9239 0 -0.3827 0.7071 0 -0.7071
  [4,16,0.7071,1,-0.7071,0.9239,1,-0.3827,0.9239,0,-0.3827,0.7071,0,-0.7071],
// 5 24 0.7071 0 -0.7071 0.7071 1 -0.7071 0.9239 0 -0.3827 0.3827 0 -0.9239
  [5,24,0.7071,0,-0.7071,0.7071,1,-0.7071,0.9239,0,-0.3827,0.3827,0,-0.9239],
// 4 16 0.9239 1 -0.3827 1 1 0 1 0 0 0.9239 0 -0.3827
  [4,16,0.9239,1,-0.3827,1,1,0,1,0,0,0.9239,0,-0.3827],
// 5 24 0.9239 0 -0.3827 0.9239 1 -0.3827 1 0 0 0.7071 0 -0.7071
  [5,24,0.9239,0,-0.3827,0.9239,1,-0.3827,1,0,0,0.7071,0,-0.7071],
// 0
];
module ldraw_lib__4_4cyli(step=0, col=false, unit=2/5, alt=false, line=0.2, solid=!$preview)
    makepoly(ldraw_lib__4_4cyli(), step=step, col=col, unit=unit, alt=alt, line=line, solid=solid);
ldraw_lib__4_4cyli(line=0.2);
// file: s/98138s01.scad
use <../../lib.scad>
use <../../p/4-4ring9.scad>
use <98138s02.scad>
function ldraw_lib__s__98138s01() = [
// 0 ~Tile  1 x  1 Round with Groove with Partial Top Face
// 0 Name: s\98138s01.dat
// 0 Author: Magnus Forsberg [MagFors]
// 0 !LDRAW_ORG Subpart UPDATE 2020-01
// 0 !LICENSE Licensed under CC BY 4.0 : see CAreadme.txt
// 
// 0 BFC CERTIFY CCW
  [0,"BFC","CERTIFY"],
  [0,"BFC","CCW"],
// 
// 0 !HISTORY 2011-12-29 [PTadmin] Official Update 2011-02
// 0 !HISTORY 2016-06-17 [MagFors] Reduced the rounded edge to 0.5 ldu
// 0 !HISTORY 2016-12-31 [PTadmin] Official Update 2016-01
// 0 !HISTORY 2019-06-17 [MagFors] Removed the rounded edge
// 0 !HISTORY 2019-07-19 [MagFors] Subfiled without top surface
// 0 !HISTORY 2020-06-28 [PTadmin] Official Update 2020-01
// 
// 
// 1 16 0 0 0 1 0 0 0 1 0 0 0 1 s\98138s02.dat
  [1,16,0,0,0,1,0,0,0,1,0,0,0,1, ldraw_lib__s__98138s02()],
// 1 16 0 0 0 1 0 0 0 1 0 0 0 1 4-4ring9.dat
  [1,16,0,0,0,1,0,0,0,1,0,0,0,1, ldraw_lib__4_4ring9()],
];
module ldraw_lib__s__98138s01(step=0, col=false, unit=2/5, alt=false, line=0.2, solid=!$preview)
    makepoly(ldraw_lib__s__98138s01(), step=step, col=col, unit=unit, alt=alt, line=line, solid=solid);
ldraw_lib__s__98138s01(line=0.2);
// file: ../p/4-4disc.scad
use <../lib.scad>
function ldraw_lib__4_4disc() = [
// 0 Disc 1.0
// 0 Name: 4-4disc.dat
// 0 Author: James Jessiman
// 0 !LDRAW_ORG Primitive UPDATE 2002-02
// 0 !LICENSE Licensed under CC BY 4.0 : see CAreadme.txt
// 
// 0 BFC CERTIFY CCW
  [0,"BFC","CERTIFY"],
  [0,"BFC","CCW"],
// 
// 0 !HISTORY 1998-12-15 [PTadmin] Official Update 1998-10
// 0 !HISTORY 2002-03-23 [sbliss] Added BFC statement
// 0 !HISTORY 2002-04-25 [PTadmin] Official Update 2002-02
// 0 !HISTORY 2007-06-24 [PTadmin] Header formatted for Contributor Agreement
// 0 !HISTORY 2008-07-01 [PTadmin] Official Update 2008-01
// 
// 
// 3 16 0 0 0 1 0 0 0.9239 0 0.3827
  [3,16,0,0,0,1,0,0,0.9239,0,0.3827],
// 3 16 0 0 0 0.9239 0 0.3827 0.7071 0 0.7071
  [3,16,0,0,0,0.9239,0,0.3827,0.7071,0,0.7071],
// 3 16 0 0 0 0.7071 0 0.7071 0.3827 0 0.9239
  [3,16,0,0,0,0.7071,0,0.7071,0.3827,0,0.9239],
// 3 16 0 0 0 0.3827 0 0.9239 0 0 1
  [3,16,0,0,0,0.3827,0,0.9239,0,0,1],
// 3 16 0 0 0 0 0 1 -0.3827 0 0.9239
  [3,16,0,0,0,0,0,1,-0.3827,0,0.9239],
// 3 16 0 0 0 -0.3827 0 0.9239 -0.7071 0 0.7071
  [3,16,0,0,0,-0.3827,0,0.9239,-0.7071,0,0.7071],
// 3 16 0 0 0 -0.7071 0 0.7071 -0.9239 0 0.3827
  [3,16,0,0,0,-0.7071,0,0.7071,-0.9239,0,0.3827],
// 3 16 0 0 0 -0.9239 0 0.3827 -1 0 -0
  [3,16,0,0,0,-0.9239,0,0.3827,-1,0,-0],
// 3 16 0 0 0 -1 0 -0 -0.9239 0 -0.3827
  [3,16,0,0,0,-1,0,-0,-0.9239,0,-0.3827],
// 3 16 0 0 0 -0.9239 0 -0.3827 -0.7071 0 -0.7071
  [3,16,0,0,0,-0.9239,0,-0.3827,-0.7071,0,-0.7071],
// 3 16 0 0 0 -0.7071 0 -0.7071 -0.3827 0 -0.9239
  [3,16,0,0,0,-0.7071,0,-0.7071,-0.3827,0,-0.9239],
// 3 16 0 0 0 -0.3827 0 -0.9239 0 0 -1
  [3,16,0,0,0,-0.3827,0,-0.9239,0,0,-1],
// 3 16 0 0 0 0 0 -1 0.3827 0 -0.9239
  [3,16,0,0,0,0,0,-1,0.3827,0,-0.9239],
// 3 16 0 0 0 0.3827 0 -0.9239 0.7071 0 -0.7071
  [3,16,0,0,0,0.3827,0,-0.9239,0.7071,0,-0.7071],
// 3 16 0 0 0 0.7071 0 -0.7071 0.9239 0 -0.3827
  [3,16,0,0,0,0.7071,0,-0.7071,0.9239,0,-0.3827],
// 3 16 0 0 0 0.9239 0 -0.3827 1 0 0
  [3,16,0,0,0,0.9239,0,-0.3827,1,0,0],
// 0
];
module ldraw_lib__4_4disc(step=0, col=false, unit=2/5, alt=false, line=0.2, solid=!$preview)
    makepoly(ldraw_lib__4_4disc(), step=step, col=col, unit=unit, alt=alt, line=line, solid=solid);
ldraw_lib__4_4disc(line=0.2);
// file: ../p/4-4cylc3.scad
use <../lib.scad>
use <4-4cyli.scad>
use <4-4disc.scad>
function ldraw_lib__4_4cylc3() = [
// 0 Cylinder Closed 1.0 without Top or Bottom Edge Lines
// 0 Name: 4-4cylc3.dat
// 0 Author: Chris Dee [cwdee]
// 0 !LDRAW_ORG Primitive UPDATE 2017-01
// 0 !LICENSE Licensed under CC BY 4.0 : see CAreadme.txt
// 
// 0 BFC CERTIFY CCW
  [0,"BFC","CERTIFY"],
  [0,"BFC","CCW"],
// 
// 0 !HISTORY 2017-12-30 [PTadmin] Official Update 2017-01
// 
// 
// 1 16 0 0 0 1 0 0 0 1 0 0 0 1 4-4disc.dat
  [1,16,0,0,0,1,0,0,0,1,0,0,0,1, ldraw_lib__4_4disc()],
// 1 16 0 0 0 1 0 0 0 1 0 0 0 1 4-4cyli.dat
  [1,16,0,0,0,1,0,0,0,1,0,0,0,1, ldraw_lib__4_4cyli()],
// 0
];
module ldraw_lib__4_4cylc3(step=0, col=false, unit=2/5, alt=false, line=0.2, solid=!$preview)
    makepoly(ldraw_lib__4_4cylc3(), step=step, col=col, unit=unit, alt=alt, line=line, solid=solid);
ldraw_lib__4_4cylc3(line=0.2);
// file: 98138.scad
use <../lib.scad>
use <../p/4-4disc.scad>
use <s/98138s01.scad>
function ldraw_lib__98138() = [
// 0 Tile  1 x  1 Round with Groove
// 0 Name: 98138.dat
// 0 Author: Magnus Forsberg [MagFors]
// 0 !LDRAW_ORG Part UPDATE 2011-02
// 0 !LICENSE Licensed under CC BY 4.0 : see CAreadme.txt
// 
// 0 BFC CERTIFY CCW
  [0,"BFC","CERTIFY"],
  [0,"BFC","CCW"],
// 
// 0 !HISTORY 2011-12-29 [PTadmin] Official Update 2011-02
// 
// 
// 1 16 0 0 0 1 0 0 0 1 0 0 0 1 s\98138s01.dat
  [1,16,0,0,0,1,0,0,0,1,0,0,0,1, ldraw_lib__s__98138s01()],
// 1 16 0 0 0 9 0 0 0 1 0 0 0 9 4-4disc.dat
  [1,16,0,0,0,9,0,0,0,1,0,0,0,9, ldraw_lib__4_4disc()],
// 
];
module ldraw_lib__98138(step=0, col=false, unit=2/5, alt=false, line=0.2, solid=!$preview)
    makepoly(ldraw_lib__98138(), step=step, col=col, unit=unit, alt=alt, line=line, solid=solid);
ldraw_lib__98138(line=0.2);
// file: 6075063a.scad
use <../lib.scad>
use <../p/4-4cylc3.scad>
use <../p/4-4disc.scad>
function ldraw_lib__6075063a() = [
// 0 Sticker  0.9 x  0.9 Round with Red Surface
// 0 Name: 6075063a.dat
// 0 Author: Gabriel Läufer [Dr.Bricktacular]
// 0 !LDRAW_ORG Part UPDATE 2025-01
// 0 !LICENSE Licensed under CC BY 4.0 : see CAreadme.txt
// 
// 0 BFC CERTIFY CCW
  [0,"BFC","CERTIFY"],
  [0,"BFC","CCW"],
// 
// 0 !KEYWORDS Bricklink 76023stk02, Brickowl 485918, Rebrickable 17688, Set 76023
// 0 !KEYWORDS The Dark Knight Trilogy, The Tumbler
// 
// 0 !HISTORY 2025-01-20 [OrionP] Official Update 2025-01
// 
// 0 // Sticker-Bottom
// 1 16 0 0 0 8.5 0 0 0 -0.25 0 0 0 8.5 4-4cylc3.dat
  [1,16,0,0,0,8.5,0,0,0,-0.25,0,0,0,8.5, ldraw_lib__4_4cylc3()],
// 
// 0 // Sticker-Front
// 1 4 0 -.25 0 8.5 0 0 0 1 0 0 0 8.5 4-4disc.dat
  [1,4,0,-.25,0,8.5,0,0,0,1,0,0,0,8.5, ldraw_lib__4_4disc()],
];
module ldraw_lib__6075063a(step=0, col=false, unit=2/5, alt=false, line=0.2, solid=!$preview)
    makepoly(ldraw_lib__6075063a(), step=step, col=col, unit=unit, alt=alt, line=line, solid=solid);
ldraw_lib__6075063a(line=0.2);
// main file
use <../lib.scad>
use <6075063a.scad>
use <98138.scad>
function ldraw_lib__98138d01() = [
// 0 Tile  1 x  1 Round with Red Surface Sticker
// 0 Name: 98138d01.dat
// 0 Author: Gabriel Läufer [Dr.Bricktacular]
// 0 !LDRAW_ORG Shortcut UPDATE 2025-01
// 0 !LICENSE Licensed under CC BY 4.0 : see CAreadme.txt
// 
// 0 BFC CERTIFY CCW
  [0,"BFC","CERTIFY"],
  [0,"BFC","CCW"],
// 
// 0 !CATEGORY Sticker Shortcut
// 0 !KEYWORDS Bricklink 98138pb170, Set 76023, The Dark Knight Trilogy
// 0 !KEYWORDS The Tumbler
// 
// 0 !HISTORY 2025-01-20 [OrionP] Official Update 2025-01
// 
// 0 // Sticker-Basepart
// 1 16 0 0 0 1 0 0 0 1 0 0 0 1 98138.dat
  [1,16,0,0,0,1,0,0,0,1,0,0,0,1, ldraw_lib__98138()],
// 
// 0 // Sticker
// 1 16 0 0 0 1 0 0 0 1 0 0 0 1 6075063a.dat
  [1,16,0,0,0,1,0,0,0,1,0,0,0,1, ldraw_lib__6075063a()],
];
module ldraw_lib__98138d01(step=0, col=false, unit=2/5, alt=false, line=0.2, solid=!$preview)
    makepoly(ldraw_lib__98138d01(), step=step, col=col, unit=unit, alt=alt, line=line, solid=solid);
ldraw_lib__98138d01(line=0.2);
